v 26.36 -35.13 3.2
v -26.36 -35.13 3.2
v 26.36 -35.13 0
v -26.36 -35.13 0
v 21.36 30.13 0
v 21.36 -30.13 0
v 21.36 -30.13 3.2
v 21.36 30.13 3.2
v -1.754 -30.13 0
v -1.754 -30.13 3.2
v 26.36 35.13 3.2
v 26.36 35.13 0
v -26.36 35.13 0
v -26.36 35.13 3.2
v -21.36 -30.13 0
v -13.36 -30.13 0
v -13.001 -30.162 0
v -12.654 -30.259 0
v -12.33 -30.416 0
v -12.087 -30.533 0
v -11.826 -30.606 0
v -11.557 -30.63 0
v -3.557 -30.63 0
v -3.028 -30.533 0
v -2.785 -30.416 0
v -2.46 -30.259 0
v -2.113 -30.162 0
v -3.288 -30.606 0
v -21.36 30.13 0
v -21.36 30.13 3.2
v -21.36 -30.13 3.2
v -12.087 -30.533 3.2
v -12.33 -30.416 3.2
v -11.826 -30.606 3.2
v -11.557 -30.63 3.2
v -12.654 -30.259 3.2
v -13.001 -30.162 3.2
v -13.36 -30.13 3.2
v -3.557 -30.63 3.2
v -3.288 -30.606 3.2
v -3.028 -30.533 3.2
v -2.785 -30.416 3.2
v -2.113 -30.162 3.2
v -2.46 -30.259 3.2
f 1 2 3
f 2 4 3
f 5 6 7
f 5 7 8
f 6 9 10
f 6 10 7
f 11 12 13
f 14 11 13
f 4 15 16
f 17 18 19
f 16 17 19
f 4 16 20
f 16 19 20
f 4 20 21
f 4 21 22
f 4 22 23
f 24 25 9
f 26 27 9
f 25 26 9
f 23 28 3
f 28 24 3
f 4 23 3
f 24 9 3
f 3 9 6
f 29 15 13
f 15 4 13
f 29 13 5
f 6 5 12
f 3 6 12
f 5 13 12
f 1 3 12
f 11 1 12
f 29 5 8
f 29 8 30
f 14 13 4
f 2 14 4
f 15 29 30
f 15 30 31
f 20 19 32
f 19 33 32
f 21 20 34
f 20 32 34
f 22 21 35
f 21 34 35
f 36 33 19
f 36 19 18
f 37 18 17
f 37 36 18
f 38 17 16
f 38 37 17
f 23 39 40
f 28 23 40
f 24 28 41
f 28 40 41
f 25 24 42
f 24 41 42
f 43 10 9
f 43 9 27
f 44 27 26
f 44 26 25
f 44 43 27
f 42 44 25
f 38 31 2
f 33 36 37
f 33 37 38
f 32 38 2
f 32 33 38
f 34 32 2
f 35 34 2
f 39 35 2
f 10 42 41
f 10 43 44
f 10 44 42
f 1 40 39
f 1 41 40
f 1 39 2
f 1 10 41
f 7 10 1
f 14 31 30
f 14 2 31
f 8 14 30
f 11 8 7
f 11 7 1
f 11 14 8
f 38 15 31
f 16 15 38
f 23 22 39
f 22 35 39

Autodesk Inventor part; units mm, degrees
ref_plane "YZ Plane" through (0, 0, 0) normal (1, 0, 0) x (0, 1, 0)
ref_plane "XZ Plane" through (0, 0, 0) normal (0, 1, 0) x (-1, 0, 0)
ref_plane "XY Plane" through (0, 0, 0) normal (0, 0, 1) x (1, 0, 0)
sketch "Sketch1" plane through (0, 0, 0) normal (0, 0, 1) x (1, 0, 0)
  line L0 (-26.36, -35.13) -> (26.36, -35.13)
  line L1 (26.36, -35.13) -> (26.36, 35.13)
  line L2 (26.36, 35.13) -> (-26.36, 35.13)
  line L3 (-26.36, 35.13) -> (-26.36, -35.13)
  line L4 (-26.36, -35.13) -> (26.36, 35.13) construction
  line L5 (26.36, -35.13) -> (-26.36, 35.13) construction
  line L6 (-21.36, -30.13) -> (21.36, -30.13)
  line L7 (21.36, -30.13) -> (21.36, 30.13)
  line L8 (21.36, 30.13) -> (-21.36, 30.13)
  line L9 (-21.36, 30.13) -> (-21.36, -30.13)
  line L10 (-21.36, -30.13) -> (21.36, 30.13) construction
  line L11 (21.36, -30.13) -> (-21.36, 30.13) construction
  point P0 (0, 0)
  dimension "t" = 5
  dimension "d1" = 5
  dimension "d2" = 60.26
  dimension "d3" = 42.72
extrude "Extrusion1" add sketch "Sketch1" along normal blind 3.2
sketch "Sketch2" plane through (0, 0, 3.2) normal (0, 0, 1) x (1, 0, 0)
  line L0 (-11.5572, -30.63) -> (-3.5572, -30.63)
  arc A0 (-3.5572, -30.63) -> (-2.7846, -30.4157) centre (-3.5572, -29.13) ccw
  arc A1 (-1.7544, -30.13) -> (-2.7846, -30.4157) centre (-1.7544, -32.13) ccw
  line L1 (21.36, -30.13) -> (-21.36, -30.13) projected
  line L2 (-7.5572, -30.63) -> (-7.5572, -30.13)
  arc A2 (-12.3298, -30.4157) -> (-11.5572, -30.63) centre (-11.5572, -29.13) ccw
  arc A3 (-12.3298, -30.4157) -> (-13.36, -30.13) centre (-13.36, -32.13) ccw
  point P0 (0, 0)
  point P1 (-13.36, -30.13)
  dimension "d6" = 0.5
  dimension "d7" = 8
  dimension "d8" = 1.5
  dimension "d9" = 2
  dimension "d10" = 8
extrude "Extrusion2" cut sketch "Sketch2" against normal blind 3.2
equation "\"d1\" = t"
properties part number "LCDFrame"
